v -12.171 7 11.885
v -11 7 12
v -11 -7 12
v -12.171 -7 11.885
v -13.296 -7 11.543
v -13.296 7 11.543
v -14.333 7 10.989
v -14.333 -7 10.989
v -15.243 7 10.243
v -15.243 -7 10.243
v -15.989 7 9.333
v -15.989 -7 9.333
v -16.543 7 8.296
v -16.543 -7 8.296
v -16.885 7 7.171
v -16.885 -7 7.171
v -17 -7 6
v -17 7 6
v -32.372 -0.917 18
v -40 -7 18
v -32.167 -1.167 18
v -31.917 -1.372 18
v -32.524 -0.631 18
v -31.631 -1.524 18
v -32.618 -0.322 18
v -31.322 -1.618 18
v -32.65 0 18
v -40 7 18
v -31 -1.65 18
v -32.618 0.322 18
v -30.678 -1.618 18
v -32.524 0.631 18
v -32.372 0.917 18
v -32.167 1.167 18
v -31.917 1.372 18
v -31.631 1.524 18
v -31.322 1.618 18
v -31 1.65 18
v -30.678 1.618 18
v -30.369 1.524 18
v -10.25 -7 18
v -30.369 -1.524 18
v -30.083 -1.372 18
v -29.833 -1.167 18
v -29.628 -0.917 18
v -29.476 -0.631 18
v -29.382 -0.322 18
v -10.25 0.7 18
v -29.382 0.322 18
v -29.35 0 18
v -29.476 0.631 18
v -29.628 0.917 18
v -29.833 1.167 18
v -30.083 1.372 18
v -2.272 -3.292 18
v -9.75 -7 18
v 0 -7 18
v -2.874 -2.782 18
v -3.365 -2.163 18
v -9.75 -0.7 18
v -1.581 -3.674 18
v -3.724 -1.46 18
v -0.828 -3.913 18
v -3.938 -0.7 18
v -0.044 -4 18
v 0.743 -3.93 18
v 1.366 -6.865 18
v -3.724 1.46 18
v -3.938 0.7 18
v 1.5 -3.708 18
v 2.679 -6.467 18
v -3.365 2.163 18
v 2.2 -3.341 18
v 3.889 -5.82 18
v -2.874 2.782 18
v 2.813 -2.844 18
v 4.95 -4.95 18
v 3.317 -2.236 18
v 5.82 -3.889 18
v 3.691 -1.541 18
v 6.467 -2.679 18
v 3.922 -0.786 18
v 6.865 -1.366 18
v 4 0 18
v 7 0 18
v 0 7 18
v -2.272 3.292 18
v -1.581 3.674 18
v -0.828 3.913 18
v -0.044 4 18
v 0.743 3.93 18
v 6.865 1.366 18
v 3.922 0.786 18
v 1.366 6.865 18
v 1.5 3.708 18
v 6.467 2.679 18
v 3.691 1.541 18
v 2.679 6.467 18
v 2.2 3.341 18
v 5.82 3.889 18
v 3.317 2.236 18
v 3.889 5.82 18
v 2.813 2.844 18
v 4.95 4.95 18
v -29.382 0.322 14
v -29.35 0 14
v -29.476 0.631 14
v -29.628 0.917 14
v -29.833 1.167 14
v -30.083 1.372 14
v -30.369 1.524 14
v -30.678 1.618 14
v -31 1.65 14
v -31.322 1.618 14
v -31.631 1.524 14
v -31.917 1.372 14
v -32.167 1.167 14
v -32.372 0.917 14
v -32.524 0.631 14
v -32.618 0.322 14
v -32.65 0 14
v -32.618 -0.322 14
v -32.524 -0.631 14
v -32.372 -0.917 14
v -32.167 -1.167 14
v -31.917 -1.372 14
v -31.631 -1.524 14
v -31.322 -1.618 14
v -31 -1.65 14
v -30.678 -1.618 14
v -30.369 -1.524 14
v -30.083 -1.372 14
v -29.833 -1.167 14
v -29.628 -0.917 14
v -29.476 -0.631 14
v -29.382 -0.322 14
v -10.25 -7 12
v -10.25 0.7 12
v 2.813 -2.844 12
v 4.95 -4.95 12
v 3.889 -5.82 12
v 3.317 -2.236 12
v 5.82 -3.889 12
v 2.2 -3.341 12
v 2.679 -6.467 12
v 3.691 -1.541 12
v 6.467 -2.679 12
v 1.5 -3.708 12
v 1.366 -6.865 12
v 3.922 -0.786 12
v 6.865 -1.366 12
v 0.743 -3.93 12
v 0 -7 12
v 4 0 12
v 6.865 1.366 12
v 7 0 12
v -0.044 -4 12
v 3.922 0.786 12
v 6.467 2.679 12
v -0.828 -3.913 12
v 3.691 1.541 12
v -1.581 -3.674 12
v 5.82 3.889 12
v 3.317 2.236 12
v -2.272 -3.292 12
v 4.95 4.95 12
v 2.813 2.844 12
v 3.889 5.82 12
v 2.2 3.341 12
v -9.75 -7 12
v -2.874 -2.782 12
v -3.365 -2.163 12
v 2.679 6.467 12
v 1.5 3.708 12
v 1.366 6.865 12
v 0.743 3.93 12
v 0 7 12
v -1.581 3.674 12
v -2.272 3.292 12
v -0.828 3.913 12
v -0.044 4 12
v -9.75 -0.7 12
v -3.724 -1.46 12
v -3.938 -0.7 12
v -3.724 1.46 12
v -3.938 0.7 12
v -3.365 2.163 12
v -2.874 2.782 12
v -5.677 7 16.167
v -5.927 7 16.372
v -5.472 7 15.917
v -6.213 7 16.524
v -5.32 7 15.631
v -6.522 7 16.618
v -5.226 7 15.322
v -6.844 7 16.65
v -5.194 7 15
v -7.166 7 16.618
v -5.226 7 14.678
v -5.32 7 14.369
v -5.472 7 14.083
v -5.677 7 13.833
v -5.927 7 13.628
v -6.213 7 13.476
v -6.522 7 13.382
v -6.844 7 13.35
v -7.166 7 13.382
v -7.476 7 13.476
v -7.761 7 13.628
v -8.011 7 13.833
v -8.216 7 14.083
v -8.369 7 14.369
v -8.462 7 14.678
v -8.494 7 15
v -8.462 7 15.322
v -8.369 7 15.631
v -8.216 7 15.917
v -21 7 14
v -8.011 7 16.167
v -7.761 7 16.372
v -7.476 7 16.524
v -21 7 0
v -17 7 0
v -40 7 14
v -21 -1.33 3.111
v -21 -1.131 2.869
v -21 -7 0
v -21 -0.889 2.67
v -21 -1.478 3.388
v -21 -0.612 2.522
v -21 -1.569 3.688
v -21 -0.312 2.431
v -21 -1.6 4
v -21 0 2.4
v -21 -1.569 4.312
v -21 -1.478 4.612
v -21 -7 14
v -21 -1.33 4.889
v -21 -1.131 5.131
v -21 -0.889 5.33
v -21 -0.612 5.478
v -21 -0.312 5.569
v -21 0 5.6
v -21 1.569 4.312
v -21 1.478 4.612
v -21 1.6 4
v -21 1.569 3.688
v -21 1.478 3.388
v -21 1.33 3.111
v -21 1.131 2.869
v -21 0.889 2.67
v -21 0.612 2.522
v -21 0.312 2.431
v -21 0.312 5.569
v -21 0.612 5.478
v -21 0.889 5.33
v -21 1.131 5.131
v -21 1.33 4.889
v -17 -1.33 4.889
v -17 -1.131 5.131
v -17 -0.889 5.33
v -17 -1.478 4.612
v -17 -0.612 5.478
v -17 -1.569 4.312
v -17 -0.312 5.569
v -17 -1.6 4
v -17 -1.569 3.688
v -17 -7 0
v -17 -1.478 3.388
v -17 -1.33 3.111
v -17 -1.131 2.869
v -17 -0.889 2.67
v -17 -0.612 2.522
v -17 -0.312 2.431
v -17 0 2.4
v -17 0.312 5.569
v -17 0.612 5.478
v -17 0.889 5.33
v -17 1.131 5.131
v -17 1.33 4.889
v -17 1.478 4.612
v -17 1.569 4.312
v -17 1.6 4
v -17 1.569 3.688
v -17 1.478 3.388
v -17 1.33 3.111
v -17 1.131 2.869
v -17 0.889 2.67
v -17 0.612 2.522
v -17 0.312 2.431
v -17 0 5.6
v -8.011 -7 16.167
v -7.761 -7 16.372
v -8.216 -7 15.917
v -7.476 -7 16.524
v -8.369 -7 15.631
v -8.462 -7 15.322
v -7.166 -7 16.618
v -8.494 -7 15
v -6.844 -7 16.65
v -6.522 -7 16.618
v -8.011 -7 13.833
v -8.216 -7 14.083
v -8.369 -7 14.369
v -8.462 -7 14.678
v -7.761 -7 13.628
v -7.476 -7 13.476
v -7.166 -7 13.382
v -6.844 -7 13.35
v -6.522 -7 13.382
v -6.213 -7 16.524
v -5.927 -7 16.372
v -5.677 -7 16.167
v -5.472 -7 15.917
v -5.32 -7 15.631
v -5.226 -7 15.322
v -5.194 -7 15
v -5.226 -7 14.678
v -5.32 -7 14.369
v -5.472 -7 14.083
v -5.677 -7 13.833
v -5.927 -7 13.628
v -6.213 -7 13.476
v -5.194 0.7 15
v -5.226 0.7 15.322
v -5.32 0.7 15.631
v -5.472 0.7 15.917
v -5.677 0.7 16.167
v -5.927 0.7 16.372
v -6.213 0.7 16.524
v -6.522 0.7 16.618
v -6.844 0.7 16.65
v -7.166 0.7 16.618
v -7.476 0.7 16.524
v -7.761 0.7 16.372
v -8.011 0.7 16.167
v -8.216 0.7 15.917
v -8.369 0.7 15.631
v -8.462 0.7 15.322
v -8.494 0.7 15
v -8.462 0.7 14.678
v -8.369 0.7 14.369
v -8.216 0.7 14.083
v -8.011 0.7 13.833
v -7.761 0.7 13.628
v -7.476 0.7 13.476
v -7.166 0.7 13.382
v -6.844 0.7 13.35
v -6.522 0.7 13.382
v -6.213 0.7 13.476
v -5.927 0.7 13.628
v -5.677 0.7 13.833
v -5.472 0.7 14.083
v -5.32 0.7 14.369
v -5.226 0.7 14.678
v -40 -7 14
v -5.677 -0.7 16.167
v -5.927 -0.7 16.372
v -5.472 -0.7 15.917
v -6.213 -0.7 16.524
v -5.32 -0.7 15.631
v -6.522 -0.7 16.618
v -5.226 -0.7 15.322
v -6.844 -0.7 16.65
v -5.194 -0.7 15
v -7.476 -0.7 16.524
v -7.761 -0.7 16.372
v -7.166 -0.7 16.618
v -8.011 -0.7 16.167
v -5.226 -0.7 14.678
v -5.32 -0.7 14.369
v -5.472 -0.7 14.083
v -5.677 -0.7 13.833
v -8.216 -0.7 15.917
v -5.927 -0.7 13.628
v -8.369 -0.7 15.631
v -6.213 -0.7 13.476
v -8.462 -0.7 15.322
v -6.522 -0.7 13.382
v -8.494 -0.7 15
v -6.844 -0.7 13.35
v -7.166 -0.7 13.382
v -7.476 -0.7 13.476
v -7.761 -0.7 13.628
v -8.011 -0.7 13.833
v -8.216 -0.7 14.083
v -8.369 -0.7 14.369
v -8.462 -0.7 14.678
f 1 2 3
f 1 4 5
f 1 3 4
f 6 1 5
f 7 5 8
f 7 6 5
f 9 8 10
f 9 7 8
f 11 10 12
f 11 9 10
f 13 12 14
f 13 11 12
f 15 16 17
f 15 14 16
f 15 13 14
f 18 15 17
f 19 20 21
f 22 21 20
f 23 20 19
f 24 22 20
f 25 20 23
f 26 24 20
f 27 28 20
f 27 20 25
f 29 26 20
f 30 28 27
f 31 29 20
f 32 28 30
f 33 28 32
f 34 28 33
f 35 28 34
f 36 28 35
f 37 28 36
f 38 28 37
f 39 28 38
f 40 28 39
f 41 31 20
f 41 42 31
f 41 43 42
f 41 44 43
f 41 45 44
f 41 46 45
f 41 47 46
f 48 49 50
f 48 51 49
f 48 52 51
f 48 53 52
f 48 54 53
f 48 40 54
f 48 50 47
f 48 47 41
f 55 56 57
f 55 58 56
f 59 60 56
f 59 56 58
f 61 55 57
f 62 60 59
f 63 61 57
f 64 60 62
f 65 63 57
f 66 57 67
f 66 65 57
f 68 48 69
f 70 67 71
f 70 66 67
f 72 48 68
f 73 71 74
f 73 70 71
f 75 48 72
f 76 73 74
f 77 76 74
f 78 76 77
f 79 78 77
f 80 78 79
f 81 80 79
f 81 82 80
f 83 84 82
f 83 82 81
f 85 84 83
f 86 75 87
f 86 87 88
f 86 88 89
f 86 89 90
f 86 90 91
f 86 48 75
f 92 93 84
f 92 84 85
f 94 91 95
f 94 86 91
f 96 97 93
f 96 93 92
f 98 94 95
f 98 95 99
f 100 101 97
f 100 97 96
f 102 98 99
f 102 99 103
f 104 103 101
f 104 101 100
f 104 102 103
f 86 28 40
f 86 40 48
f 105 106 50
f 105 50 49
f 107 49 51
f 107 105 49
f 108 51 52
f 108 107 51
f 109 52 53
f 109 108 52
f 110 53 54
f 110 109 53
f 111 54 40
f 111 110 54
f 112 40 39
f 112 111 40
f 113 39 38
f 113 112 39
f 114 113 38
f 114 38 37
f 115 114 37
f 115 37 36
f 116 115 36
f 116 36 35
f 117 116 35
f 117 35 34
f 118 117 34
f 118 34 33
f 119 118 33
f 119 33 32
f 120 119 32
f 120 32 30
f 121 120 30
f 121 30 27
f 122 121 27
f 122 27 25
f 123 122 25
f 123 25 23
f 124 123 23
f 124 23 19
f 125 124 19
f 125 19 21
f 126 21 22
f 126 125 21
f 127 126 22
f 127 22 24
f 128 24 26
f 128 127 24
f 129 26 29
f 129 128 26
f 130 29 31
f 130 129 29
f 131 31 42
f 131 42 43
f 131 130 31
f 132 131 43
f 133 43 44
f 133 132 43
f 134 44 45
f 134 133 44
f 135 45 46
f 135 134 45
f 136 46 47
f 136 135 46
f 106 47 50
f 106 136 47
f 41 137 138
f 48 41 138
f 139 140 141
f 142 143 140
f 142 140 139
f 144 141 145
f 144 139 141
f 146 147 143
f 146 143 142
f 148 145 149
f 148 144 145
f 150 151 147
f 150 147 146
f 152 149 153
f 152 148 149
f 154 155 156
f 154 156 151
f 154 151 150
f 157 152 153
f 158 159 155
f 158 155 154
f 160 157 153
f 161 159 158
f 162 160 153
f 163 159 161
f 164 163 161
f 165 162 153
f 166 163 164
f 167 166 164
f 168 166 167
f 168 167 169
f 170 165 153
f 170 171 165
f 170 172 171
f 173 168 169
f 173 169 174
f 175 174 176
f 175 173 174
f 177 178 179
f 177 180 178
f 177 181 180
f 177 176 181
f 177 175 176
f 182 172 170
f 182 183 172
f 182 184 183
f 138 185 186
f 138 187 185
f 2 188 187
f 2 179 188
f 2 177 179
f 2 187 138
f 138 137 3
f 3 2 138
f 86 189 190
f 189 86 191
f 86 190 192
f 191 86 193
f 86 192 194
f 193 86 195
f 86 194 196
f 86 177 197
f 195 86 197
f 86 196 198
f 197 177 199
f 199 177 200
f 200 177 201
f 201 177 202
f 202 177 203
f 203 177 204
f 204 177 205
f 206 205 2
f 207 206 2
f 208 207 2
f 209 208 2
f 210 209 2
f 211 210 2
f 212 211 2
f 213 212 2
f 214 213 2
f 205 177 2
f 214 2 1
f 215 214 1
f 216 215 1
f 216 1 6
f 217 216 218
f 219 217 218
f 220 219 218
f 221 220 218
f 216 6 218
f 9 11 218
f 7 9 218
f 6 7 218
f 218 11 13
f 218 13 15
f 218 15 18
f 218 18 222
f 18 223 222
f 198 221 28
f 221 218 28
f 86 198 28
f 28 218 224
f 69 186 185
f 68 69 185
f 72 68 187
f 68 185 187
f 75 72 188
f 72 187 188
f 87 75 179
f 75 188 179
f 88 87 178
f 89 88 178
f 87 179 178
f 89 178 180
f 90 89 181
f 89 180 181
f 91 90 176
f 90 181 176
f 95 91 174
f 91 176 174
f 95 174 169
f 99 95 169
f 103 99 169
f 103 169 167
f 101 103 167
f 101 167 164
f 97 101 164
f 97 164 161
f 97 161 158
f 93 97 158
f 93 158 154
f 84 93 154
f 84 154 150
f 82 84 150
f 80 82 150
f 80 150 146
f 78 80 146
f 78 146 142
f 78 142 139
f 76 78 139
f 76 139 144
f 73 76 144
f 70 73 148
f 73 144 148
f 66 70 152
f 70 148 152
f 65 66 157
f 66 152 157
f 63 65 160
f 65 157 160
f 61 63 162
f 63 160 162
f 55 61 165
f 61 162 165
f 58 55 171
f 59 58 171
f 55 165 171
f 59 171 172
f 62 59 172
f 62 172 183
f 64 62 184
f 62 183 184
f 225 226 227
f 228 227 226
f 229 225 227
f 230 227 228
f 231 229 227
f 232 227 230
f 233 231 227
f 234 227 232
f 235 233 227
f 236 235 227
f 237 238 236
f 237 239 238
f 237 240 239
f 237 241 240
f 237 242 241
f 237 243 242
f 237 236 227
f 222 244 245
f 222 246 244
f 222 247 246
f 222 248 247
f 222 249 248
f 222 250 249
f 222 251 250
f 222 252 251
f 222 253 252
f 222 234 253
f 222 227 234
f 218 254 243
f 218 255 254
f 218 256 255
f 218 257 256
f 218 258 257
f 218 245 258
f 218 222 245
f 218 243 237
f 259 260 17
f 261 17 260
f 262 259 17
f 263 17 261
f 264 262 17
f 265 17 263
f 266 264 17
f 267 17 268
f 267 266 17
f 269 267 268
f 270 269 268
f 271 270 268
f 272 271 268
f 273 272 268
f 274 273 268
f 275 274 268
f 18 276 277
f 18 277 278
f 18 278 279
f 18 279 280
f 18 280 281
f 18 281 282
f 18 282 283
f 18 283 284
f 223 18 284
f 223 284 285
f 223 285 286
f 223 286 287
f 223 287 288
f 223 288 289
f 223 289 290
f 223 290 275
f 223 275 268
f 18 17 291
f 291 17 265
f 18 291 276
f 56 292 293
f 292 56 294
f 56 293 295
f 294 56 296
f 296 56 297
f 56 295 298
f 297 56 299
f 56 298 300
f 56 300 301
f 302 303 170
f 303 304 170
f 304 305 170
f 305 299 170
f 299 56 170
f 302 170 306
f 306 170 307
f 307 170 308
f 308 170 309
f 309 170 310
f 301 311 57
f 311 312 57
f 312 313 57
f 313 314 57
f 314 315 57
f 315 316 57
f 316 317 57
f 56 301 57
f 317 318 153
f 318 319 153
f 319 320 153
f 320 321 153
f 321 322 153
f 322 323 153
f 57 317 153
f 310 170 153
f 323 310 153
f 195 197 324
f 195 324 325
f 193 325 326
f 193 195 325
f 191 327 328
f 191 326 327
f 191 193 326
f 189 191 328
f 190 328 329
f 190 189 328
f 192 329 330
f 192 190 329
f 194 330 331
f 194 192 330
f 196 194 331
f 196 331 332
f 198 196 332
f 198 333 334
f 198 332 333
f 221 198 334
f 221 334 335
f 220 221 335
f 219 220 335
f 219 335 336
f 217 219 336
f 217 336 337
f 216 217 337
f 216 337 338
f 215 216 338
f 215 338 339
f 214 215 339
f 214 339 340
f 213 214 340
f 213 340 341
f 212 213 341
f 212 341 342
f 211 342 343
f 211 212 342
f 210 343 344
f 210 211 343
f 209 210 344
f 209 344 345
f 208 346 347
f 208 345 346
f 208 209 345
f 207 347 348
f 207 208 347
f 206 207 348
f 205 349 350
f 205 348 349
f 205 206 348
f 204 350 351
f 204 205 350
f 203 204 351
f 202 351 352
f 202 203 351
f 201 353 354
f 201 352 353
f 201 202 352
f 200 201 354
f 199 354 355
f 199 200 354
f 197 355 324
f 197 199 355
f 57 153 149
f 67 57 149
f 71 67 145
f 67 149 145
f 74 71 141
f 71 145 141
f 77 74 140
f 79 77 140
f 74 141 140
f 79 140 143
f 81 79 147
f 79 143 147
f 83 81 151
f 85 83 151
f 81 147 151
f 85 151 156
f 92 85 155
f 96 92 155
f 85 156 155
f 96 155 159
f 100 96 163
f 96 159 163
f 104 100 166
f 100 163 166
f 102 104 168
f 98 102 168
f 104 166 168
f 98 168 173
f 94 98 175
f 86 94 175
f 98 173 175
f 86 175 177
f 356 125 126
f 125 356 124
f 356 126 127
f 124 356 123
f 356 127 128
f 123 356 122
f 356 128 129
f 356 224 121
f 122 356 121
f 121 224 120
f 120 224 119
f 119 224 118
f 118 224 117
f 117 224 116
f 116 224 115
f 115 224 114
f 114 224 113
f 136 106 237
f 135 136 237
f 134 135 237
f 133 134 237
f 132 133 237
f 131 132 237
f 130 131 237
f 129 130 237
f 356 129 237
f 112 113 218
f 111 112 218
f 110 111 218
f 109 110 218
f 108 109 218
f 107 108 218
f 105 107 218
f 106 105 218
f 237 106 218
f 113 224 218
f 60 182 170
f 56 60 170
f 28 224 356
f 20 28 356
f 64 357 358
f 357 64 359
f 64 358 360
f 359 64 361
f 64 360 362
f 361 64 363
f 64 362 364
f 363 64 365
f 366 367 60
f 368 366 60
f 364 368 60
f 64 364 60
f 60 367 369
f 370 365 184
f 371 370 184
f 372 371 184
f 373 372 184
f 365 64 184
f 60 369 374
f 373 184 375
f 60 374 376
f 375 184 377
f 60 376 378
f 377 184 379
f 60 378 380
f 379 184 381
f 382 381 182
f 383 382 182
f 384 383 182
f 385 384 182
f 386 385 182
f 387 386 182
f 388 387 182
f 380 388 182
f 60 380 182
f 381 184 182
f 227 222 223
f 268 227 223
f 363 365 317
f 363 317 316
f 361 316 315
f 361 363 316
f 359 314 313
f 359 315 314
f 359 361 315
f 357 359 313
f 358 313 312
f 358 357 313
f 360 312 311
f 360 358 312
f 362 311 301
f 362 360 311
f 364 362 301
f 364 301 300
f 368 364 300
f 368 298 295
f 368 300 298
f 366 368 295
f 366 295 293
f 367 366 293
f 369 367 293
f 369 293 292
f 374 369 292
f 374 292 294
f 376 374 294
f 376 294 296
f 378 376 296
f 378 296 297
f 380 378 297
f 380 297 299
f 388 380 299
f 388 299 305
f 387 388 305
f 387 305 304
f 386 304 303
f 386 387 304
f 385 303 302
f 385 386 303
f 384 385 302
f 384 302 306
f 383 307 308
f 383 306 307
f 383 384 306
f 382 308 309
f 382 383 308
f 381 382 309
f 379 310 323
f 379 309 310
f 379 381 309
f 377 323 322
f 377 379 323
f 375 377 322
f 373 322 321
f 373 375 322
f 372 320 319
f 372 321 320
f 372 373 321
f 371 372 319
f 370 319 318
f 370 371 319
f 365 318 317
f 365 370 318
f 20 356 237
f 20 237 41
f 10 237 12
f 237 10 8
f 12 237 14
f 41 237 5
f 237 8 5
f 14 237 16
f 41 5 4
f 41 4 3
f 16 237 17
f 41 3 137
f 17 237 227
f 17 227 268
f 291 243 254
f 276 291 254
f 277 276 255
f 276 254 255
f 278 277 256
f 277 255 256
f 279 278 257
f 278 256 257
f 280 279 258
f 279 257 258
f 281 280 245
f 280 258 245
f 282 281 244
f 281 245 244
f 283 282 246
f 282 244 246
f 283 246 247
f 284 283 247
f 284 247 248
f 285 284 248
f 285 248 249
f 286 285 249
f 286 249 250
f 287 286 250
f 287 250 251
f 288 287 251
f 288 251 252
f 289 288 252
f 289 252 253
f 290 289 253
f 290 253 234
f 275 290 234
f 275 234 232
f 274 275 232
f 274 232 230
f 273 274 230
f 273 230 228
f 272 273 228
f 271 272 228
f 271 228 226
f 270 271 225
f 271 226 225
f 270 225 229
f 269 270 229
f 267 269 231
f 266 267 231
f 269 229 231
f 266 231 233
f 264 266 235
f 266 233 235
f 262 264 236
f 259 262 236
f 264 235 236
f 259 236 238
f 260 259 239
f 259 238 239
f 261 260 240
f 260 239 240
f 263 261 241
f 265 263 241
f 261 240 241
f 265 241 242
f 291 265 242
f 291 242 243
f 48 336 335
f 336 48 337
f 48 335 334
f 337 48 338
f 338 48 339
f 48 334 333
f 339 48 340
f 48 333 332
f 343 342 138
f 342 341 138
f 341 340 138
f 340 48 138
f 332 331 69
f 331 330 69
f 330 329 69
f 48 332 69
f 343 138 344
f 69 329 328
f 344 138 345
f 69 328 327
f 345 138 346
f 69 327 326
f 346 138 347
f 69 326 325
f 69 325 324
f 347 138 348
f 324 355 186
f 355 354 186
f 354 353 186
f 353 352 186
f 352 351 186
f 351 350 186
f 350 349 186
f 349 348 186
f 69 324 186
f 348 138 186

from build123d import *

# Parameters (mm, degrees)
ESBO_O2_R                  = 1.65
RESSALTO_EXTRUS_O1_DEPTH   = 18
CORTE_EXTRUS_O1_DEPTH      = 47.043457733
CORTE_EXTRUS_O1_DEPTH_BACK = 47.043457733
ESBO_O3_R                  = 1.65
ESBO_O3_W                  = 19
ESBO_O3_H                  = 14
ESBO_O4_R                  = 1.6
CORTE_EXTRUS_O2_DEPTH      = 18


with BuildPart() as part:
    # Esboço2 → Ressalto-extrusão1 (new body)
    with BuildSketch(Plane.XY):
        with BuildLine():
            Line((0, 7), (-40, 7))
            Line((-40, 7), (-40, -7))
            Line((-40, -7), (-10.25, -7))
            Line((-10.25, -7), (-10.25, 0.7))
            Line((-10.25, 0.7), (-3.938273734, 0.7))
            ThreePointArc((-3.938273734, 0.7), (4, 0), (-3.938273734, -0.7))
            Line((-3.938273734, -0.7), (-9.75, -0.7))
            Line((-9.75, -0.7), (-9.75, -7))
            Line((-9.75, -7), (0, -7))
            ThreePointArc((0, -7), (7, 0), (0, 7))
        make_face()
        with Locations((-31, 0)):
            Circle(ESBO_O2_R, mode=Mode.SUBTRACT)
    extrude(amount=RESSALTO_EXTRUS_O1_DEPTH)

    # Esboço3 → Corte-extrusão1 (cut, two sides: drawn at the far end of the back side and taken through both)
    with BuildSketch(Plane.XZ.offset(7).offset(-CORTE_EXTRUS_O1_DEPTH_BACK)):
        with Locations((-6.844136867, 15)):
            Circle(ESBO_O3_R)
        with Locations((-30.5, 7)):
            Rectangle(ESBO_O3_W, ESBO_O3_H)
        with BuildLine():
            Line((7, 12), (-11, 12))
            ThreePointArc((-11, 12), (-15.242640687, 10.242640687), (-17, 6))
            Line((-17, 6), (-17, 0))
            Line((-17, 0), (7, 0))
            Line((7, 0), (7, 12))
        make_face()
    extrude(amount=CORTE_EXTRUS_O1_DEPTH + CORTE_EXTRUS_O1_DEPTH_BACK, mode=Mode.SUBTRACT)

    # Esboço4 → Corte-extrusão2 (cut)
    with BuildSketch(Plane.ZY.offset(21)):
        with Locations((4, 0)):
            Circle(ESBO_O4_R)
    extrude(amount=-CORTE_EXTRUS_O2_DEPTH, mode=Mode.SUBTRACT)


solid = part.part
